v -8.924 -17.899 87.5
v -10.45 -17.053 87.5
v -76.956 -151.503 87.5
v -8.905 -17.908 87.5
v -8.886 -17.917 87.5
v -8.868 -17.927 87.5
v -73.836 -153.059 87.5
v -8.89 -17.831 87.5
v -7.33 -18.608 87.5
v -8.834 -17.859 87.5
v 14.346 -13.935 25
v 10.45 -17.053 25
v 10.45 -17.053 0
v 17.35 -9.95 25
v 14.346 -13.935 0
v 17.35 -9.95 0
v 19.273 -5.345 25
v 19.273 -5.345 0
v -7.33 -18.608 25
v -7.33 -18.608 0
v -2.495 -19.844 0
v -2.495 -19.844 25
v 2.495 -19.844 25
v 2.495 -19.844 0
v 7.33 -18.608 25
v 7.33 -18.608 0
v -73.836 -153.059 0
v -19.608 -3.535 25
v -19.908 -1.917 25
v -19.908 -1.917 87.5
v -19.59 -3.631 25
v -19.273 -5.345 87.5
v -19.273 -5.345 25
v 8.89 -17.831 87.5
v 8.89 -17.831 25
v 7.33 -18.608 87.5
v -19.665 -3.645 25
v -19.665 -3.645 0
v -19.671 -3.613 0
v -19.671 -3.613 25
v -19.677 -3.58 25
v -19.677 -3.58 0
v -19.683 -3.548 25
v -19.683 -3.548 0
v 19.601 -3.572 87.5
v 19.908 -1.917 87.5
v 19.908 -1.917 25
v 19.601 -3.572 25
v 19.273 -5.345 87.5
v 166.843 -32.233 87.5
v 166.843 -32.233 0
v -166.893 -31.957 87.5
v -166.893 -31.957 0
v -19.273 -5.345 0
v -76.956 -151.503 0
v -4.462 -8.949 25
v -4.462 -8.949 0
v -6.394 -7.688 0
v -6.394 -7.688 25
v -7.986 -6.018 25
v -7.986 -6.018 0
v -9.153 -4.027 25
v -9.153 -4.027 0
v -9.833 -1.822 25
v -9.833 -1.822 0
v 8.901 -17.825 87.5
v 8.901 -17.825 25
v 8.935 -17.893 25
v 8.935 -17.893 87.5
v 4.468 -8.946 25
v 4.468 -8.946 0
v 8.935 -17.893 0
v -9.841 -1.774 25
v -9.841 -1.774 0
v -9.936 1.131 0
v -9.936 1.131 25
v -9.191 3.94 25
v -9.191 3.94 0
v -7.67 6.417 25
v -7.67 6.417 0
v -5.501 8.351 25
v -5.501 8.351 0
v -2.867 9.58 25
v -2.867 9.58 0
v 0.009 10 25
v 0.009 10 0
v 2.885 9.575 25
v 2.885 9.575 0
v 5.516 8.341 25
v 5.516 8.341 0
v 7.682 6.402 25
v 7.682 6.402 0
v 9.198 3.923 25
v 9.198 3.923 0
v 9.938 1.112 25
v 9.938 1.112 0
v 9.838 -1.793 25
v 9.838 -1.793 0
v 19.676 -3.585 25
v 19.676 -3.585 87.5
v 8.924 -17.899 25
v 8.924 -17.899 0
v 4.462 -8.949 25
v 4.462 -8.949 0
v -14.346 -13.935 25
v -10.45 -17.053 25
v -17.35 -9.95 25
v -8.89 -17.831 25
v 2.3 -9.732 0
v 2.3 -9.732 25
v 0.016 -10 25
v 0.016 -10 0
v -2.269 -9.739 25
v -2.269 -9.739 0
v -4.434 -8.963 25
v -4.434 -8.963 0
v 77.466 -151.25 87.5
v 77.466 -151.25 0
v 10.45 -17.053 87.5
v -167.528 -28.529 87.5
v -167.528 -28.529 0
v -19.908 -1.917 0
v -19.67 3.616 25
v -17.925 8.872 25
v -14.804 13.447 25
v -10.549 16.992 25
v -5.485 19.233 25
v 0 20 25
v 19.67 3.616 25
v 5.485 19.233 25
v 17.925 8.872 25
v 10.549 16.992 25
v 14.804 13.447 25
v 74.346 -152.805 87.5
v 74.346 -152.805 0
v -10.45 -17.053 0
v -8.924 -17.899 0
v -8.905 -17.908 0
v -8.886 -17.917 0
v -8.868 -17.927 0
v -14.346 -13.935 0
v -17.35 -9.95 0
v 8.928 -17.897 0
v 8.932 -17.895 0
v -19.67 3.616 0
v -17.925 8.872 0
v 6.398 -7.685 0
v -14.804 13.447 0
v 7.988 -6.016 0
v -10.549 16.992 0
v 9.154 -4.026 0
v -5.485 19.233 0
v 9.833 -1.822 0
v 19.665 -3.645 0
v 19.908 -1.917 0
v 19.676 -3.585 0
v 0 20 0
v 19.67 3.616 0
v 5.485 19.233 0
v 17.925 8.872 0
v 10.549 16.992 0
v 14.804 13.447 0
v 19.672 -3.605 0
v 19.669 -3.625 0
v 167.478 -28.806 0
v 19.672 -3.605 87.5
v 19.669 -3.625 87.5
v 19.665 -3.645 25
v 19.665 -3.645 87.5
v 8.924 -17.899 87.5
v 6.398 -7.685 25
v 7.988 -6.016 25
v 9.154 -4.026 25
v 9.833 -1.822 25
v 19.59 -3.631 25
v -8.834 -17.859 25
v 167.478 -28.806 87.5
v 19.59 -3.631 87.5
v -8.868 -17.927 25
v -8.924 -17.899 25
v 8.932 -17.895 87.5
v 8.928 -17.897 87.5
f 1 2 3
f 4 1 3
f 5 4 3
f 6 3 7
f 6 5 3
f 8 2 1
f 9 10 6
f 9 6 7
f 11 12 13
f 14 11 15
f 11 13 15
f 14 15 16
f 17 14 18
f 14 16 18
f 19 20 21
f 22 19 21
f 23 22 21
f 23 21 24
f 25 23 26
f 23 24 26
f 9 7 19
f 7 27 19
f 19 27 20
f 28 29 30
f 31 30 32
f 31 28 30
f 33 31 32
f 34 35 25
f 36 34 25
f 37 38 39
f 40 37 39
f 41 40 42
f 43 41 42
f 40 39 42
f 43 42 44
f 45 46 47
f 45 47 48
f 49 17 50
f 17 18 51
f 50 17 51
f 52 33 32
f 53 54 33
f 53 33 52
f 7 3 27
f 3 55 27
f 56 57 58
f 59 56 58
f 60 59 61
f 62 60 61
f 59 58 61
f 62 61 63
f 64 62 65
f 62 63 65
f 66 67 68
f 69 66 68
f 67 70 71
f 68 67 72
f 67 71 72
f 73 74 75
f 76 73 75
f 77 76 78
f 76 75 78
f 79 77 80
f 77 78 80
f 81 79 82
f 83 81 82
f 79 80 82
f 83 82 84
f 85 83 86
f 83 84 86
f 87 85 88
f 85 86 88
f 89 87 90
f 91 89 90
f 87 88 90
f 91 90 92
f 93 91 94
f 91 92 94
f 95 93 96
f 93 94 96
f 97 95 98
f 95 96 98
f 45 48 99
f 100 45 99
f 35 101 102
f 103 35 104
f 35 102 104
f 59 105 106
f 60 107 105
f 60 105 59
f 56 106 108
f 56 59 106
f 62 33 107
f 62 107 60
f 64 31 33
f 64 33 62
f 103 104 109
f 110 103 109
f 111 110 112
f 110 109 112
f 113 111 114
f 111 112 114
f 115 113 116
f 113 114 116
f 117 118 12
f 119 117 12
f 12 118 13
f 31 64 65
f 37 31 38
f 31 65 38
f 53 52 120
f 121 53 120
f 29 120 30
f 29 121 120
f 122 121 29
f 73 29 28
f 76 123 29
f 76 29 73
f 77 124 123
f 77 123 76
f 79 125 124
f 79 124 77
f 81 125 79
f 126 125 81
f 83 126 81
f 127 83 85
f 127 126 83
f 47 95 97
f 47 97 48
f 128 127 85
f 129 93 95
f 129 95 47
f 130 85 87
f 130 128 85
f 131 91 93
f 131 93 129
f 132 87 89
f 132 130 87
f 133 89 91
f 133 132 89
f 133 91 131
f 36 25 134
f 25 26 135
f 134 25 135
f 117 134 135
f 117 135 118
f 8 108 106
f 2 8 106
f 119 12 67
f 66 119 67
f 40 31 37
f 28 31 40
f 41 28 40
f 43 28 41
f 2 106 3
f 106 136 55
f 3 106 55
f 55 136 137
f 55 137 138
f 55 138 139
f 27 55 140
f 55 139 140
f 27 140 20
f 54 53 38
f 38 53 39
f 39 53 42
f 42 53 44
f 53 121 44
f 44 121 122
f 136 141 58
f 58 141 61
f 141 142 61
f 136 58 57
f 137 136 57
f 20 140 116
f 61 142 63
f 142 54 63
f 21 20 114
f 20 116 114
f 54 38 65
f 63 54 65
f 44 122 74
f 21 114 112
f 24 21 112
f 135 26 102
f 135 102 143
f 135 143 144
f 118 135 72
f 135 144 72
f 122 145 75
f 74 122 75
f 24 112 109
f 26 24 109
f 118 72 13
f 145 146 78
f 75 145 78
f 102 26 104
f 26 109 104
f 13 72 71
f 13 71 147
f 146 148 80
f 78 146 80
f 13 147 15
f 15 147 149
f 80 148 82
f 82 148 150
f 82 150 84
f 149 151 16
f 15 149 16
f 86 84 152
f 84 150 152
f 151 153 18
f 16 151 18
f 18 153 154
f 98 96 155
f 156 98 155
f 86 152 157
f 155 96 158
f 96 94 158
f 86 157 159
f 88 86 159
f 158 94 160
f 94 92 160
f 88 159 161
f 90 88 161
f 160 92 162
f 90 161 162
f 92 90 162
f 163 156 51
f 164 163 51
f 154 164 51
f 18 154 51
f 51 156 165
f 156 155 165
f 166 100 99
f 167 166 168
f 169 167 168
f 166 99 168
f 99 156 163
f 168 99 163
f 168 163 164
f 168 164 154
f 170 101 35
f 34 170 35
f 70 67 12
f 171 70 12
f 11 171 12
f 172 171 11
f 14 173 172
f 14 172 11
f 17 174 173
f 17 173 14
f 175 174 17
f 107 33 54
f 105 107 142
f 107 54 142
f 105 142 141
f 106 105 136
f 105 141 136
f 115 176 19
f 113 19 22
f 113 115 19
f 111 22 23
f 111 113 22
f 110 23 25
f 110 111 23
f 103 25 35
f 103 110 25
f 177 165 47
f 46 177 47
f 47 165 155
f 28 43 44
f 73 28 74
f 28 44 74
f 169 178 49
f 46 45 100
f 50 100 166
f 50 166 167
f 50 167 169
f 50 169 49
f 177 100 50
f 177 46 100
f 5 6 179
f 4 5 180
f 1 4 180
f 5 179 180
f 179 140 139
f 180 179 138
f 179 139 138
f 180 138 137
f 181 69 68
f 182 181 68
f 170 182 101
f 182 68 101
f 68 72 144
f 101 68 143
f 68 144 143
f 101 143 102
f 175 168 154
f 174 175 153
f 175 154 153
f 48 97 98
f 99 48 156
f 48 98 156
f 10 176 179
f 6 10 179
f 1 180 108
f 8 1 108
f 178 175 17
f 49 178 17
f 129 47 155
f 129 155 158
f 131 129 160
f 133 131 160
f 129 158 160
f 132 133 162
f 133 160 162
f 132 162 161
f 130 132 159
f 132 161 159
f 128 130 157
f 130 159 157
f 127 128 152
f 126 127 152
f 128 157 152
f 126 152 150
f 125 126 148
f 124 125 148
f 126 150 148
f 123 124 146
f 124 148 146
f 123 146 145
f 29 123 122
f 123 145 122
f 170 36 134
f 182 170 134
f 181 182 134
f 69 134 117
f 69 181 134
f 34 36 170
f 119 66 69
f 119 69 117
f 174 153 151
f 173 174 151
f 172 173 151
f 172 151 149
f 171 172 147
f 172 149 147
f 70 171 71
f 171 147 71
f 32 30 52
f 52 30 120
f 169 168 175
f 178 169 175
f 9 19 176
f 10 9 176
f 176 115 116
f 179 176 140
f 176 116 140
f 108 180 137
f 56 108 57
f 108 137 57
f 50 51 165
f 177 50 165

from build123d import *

# Parameters (mm, degrees)
BOSS_EXTRUDE2_DEPTH = 25
BOSS_EXTRUDE3_DEPTH = 62.5
BOSS_EXTRUDE5_DEPTH = 62.5


with BuildPart() as part:
    # Sketch1 → Boss-Extrude2 (new body)
    with BuildSketch(Plane.XY):
        with BuildLine():
            ThreePointArc((10.449971294, -17.052803287), (15.972710201, -12.036300463), (19.272609064, -5.344767522))
            Line((19.272609064, -5.344767522), (166.842934549, -32.233408918))
            Line((166.842934549, -32.233408918), (167.478249453, -28.805556447))
            Line((167.478249453, -28.805556447), (19.907923967, -1.91691505))
            ThreePointArc((19.907923967, -1.91691505), (0, 20), (-19.907923967, -1.91691505))
            Line((-19.907923967, -1.91691505), (-167.528286005, -28.529481853))
            Line((-167.528286005, -28.529481853), (-166.892971102, -31.957334324))
            Line((-166.892971102, -31.957334324), (-19.272609064, -5.344767522))
            ThreePointArc((-19.272609064, -5.344767522), (-15.972710201, -12.036300463), (-10.449971294, -17.052803287))
            Line((-10.449971294, -17.052803287), (-76.956361195, -151.503166255))
            Line((-76.956361195, -151.503166255), (-73.836414436, -153.058714328))
            Line((-73.836414436, -153.058714328), (-7.330024534, -18.60835136))
            ThreePointArc((-7.330024534, -18.60835136), (0, -20), (7.330024534, -18.60835136))
            Line((7.330024534, -18.60835136), (74.346110853, -152.805386254))
            Line((74.346110853, -152.805386254), (77.466057613, -151.249838182))
            Line((77.466057613, -151.249838182), (10.449971294, -17.052803287))
        make_face()
        with BuildLine():
            Line((9.838021699, -1.792576093), (19.676043398, -3.585152186))
            ThreePointArc((19.676043398, -3.585152186), (19.670593316, -3.614935491), (19.665098151, -3.64471051))
            Line((19.665098151, -3.64471051), (9.832549076, -1.822355255))
            ThreePointArc((9.832549076, -1.822355255), (7.988292028, -6.015578981), (4.467739088, -8.946468993))
            Line((4.467739088, -8.946468993), (8.935478176, -17.892937986))
            ThreePointArc((8.935478176, -17.892937986), (8.929717682, -17.895813536), (8.923956262, -17.898687232))
            Line((8.923956262, -17.898687232), (4.461978131, -8.949343616))
            ThreePointArc((4.461978131, -8.949343616), (0.015753498, -9.999987591), (-4.433759327, -8.963357531))
            Line((-4.433759327, -8.963357531), (-8.867518653, -17.926715062))
            ThreePointArc((-8.867518653, -17.926715062), (-8.895748496, -17.912723375), (-8.923956262, -17.898687232))
            Line((-8.923956262, -17.898687232), (-4.461978131, -8.949343616))
            ThreePointArc((-4.461978131, -8.949343616), (-7.9863551, -6.018150232), (-9.832549076, -1.822355255))
            Line((-9.832549076, -1.822355255), (-19.665098151, -3.64471051))
            ThreePointArc((-19.665098151, -3.64471051), (-19.67396555, -3.596537162), (-19.682714938, -3.54834224))
            Line((-19.682714938, -3.54834224), (-9.841357469, -1.77417112))
            ThreePointArc((-9.841357469, -1.77417112), (0.009352411, 9.999995627), (9.838021699, -1.792576093))
        make_face(mode=Mode.SUBTRACT)
    extrude(amount=BOSS_EXTRUDE2_DEPTH)

    # Sketch2 → Boss-Extrude3 (add)
    with BuildSketch(Plane.XY.offset(25)):
        Polygon((-167.528286005, -28.529481853), (-19.907923967, -1.91691505), (-19.272609064, -5.344767522), (-166.892971102, -31.957334324), align=None)
    extrude(amount=BOSS_EXTRUDE3_DEPTH)

    # Sketch3 → Boss-Extrude5 (add)
    with BuildSketch(Plane.XY.offset(25)):
        with BuildLine():
            Line((-10.449971294, -17.052803287), (-76.956361195, -151.503166255))
            Line((-76.956361195, -151.503166255), (-73.836414436, -153.058714328))
            Line((-73.836414436, -153.058714328), (-7.330024534, -18.60835136))
            Line((-7.330024534, -18.60835136), (-8.833818914, -17.85858714))
            Line((-8.833818914, -17.85858714), (-8.867518653, -17.926715062))
            ThreePointArc((-8.867518653, -17.926715062), (-8.895748496, -17.912723375), (-8.923956262, -17.898687232))
            Line((-8.923956262, -17.898687232), (-8.889997914, -17.830577323))
            Line((-8.889997914, -17.830577323), (-10.449971294, -17.052803287))
        make_face()
        with BuildLine():
            Line((8.889997914, -17.830577323), (7.330024534, -18.60835136))
            Line((7.330024534, -18.60835136), (74.346110853, -152.805386254))
            Line((74.346110853, -152.805386254), (77.466057613, -151.249838182))
            Line((77.466057613, -151.249838182), (10.449971294, -17.052803287))
            Line((10.449971294, -17.052803287), (8.901477829, -17.824853649))
            Line((8.901477829, -17.824853649), (8.935478176, -17.892937986))
            ThreePointArc((8.935478176, -17.892937986), (8.929717682, -17.895813536), (8.923956262, -17.898687232))
            Line((8.923956262, -17.898687232), (8.889997914, -17.830577323))
        make_face()
        with BuildLine():
            Line((167.478249453, -28.805556447), (19.907923967, -1.91691505))
            Line((19.907923967, -1.91691505), (19.60125996, -3.571525971))
            Line((19.60125996, -3.571525971), (19.676043398, -3.585152186))
            ThreePointArc((19.676043398, -3.585152186), (19.670593316, -3.614935491), (19.665098151, -3.64471051))
            Line((19.665098151, -3.64471051), (19.590266516, -3.630841286))
            Line((19.590266516, -3.630841286), (19.272609064, -5.344767522))
            Line((19.272609064, -5.344767522), (166.842934549, -32.233408918))
            Line((166.842934549, -32.233408918), (167.478249453, -28.805556447))
        make_face()
    extrude(amount=BOSS_EXTRUDE5_DEPTH)


solid = part.part
